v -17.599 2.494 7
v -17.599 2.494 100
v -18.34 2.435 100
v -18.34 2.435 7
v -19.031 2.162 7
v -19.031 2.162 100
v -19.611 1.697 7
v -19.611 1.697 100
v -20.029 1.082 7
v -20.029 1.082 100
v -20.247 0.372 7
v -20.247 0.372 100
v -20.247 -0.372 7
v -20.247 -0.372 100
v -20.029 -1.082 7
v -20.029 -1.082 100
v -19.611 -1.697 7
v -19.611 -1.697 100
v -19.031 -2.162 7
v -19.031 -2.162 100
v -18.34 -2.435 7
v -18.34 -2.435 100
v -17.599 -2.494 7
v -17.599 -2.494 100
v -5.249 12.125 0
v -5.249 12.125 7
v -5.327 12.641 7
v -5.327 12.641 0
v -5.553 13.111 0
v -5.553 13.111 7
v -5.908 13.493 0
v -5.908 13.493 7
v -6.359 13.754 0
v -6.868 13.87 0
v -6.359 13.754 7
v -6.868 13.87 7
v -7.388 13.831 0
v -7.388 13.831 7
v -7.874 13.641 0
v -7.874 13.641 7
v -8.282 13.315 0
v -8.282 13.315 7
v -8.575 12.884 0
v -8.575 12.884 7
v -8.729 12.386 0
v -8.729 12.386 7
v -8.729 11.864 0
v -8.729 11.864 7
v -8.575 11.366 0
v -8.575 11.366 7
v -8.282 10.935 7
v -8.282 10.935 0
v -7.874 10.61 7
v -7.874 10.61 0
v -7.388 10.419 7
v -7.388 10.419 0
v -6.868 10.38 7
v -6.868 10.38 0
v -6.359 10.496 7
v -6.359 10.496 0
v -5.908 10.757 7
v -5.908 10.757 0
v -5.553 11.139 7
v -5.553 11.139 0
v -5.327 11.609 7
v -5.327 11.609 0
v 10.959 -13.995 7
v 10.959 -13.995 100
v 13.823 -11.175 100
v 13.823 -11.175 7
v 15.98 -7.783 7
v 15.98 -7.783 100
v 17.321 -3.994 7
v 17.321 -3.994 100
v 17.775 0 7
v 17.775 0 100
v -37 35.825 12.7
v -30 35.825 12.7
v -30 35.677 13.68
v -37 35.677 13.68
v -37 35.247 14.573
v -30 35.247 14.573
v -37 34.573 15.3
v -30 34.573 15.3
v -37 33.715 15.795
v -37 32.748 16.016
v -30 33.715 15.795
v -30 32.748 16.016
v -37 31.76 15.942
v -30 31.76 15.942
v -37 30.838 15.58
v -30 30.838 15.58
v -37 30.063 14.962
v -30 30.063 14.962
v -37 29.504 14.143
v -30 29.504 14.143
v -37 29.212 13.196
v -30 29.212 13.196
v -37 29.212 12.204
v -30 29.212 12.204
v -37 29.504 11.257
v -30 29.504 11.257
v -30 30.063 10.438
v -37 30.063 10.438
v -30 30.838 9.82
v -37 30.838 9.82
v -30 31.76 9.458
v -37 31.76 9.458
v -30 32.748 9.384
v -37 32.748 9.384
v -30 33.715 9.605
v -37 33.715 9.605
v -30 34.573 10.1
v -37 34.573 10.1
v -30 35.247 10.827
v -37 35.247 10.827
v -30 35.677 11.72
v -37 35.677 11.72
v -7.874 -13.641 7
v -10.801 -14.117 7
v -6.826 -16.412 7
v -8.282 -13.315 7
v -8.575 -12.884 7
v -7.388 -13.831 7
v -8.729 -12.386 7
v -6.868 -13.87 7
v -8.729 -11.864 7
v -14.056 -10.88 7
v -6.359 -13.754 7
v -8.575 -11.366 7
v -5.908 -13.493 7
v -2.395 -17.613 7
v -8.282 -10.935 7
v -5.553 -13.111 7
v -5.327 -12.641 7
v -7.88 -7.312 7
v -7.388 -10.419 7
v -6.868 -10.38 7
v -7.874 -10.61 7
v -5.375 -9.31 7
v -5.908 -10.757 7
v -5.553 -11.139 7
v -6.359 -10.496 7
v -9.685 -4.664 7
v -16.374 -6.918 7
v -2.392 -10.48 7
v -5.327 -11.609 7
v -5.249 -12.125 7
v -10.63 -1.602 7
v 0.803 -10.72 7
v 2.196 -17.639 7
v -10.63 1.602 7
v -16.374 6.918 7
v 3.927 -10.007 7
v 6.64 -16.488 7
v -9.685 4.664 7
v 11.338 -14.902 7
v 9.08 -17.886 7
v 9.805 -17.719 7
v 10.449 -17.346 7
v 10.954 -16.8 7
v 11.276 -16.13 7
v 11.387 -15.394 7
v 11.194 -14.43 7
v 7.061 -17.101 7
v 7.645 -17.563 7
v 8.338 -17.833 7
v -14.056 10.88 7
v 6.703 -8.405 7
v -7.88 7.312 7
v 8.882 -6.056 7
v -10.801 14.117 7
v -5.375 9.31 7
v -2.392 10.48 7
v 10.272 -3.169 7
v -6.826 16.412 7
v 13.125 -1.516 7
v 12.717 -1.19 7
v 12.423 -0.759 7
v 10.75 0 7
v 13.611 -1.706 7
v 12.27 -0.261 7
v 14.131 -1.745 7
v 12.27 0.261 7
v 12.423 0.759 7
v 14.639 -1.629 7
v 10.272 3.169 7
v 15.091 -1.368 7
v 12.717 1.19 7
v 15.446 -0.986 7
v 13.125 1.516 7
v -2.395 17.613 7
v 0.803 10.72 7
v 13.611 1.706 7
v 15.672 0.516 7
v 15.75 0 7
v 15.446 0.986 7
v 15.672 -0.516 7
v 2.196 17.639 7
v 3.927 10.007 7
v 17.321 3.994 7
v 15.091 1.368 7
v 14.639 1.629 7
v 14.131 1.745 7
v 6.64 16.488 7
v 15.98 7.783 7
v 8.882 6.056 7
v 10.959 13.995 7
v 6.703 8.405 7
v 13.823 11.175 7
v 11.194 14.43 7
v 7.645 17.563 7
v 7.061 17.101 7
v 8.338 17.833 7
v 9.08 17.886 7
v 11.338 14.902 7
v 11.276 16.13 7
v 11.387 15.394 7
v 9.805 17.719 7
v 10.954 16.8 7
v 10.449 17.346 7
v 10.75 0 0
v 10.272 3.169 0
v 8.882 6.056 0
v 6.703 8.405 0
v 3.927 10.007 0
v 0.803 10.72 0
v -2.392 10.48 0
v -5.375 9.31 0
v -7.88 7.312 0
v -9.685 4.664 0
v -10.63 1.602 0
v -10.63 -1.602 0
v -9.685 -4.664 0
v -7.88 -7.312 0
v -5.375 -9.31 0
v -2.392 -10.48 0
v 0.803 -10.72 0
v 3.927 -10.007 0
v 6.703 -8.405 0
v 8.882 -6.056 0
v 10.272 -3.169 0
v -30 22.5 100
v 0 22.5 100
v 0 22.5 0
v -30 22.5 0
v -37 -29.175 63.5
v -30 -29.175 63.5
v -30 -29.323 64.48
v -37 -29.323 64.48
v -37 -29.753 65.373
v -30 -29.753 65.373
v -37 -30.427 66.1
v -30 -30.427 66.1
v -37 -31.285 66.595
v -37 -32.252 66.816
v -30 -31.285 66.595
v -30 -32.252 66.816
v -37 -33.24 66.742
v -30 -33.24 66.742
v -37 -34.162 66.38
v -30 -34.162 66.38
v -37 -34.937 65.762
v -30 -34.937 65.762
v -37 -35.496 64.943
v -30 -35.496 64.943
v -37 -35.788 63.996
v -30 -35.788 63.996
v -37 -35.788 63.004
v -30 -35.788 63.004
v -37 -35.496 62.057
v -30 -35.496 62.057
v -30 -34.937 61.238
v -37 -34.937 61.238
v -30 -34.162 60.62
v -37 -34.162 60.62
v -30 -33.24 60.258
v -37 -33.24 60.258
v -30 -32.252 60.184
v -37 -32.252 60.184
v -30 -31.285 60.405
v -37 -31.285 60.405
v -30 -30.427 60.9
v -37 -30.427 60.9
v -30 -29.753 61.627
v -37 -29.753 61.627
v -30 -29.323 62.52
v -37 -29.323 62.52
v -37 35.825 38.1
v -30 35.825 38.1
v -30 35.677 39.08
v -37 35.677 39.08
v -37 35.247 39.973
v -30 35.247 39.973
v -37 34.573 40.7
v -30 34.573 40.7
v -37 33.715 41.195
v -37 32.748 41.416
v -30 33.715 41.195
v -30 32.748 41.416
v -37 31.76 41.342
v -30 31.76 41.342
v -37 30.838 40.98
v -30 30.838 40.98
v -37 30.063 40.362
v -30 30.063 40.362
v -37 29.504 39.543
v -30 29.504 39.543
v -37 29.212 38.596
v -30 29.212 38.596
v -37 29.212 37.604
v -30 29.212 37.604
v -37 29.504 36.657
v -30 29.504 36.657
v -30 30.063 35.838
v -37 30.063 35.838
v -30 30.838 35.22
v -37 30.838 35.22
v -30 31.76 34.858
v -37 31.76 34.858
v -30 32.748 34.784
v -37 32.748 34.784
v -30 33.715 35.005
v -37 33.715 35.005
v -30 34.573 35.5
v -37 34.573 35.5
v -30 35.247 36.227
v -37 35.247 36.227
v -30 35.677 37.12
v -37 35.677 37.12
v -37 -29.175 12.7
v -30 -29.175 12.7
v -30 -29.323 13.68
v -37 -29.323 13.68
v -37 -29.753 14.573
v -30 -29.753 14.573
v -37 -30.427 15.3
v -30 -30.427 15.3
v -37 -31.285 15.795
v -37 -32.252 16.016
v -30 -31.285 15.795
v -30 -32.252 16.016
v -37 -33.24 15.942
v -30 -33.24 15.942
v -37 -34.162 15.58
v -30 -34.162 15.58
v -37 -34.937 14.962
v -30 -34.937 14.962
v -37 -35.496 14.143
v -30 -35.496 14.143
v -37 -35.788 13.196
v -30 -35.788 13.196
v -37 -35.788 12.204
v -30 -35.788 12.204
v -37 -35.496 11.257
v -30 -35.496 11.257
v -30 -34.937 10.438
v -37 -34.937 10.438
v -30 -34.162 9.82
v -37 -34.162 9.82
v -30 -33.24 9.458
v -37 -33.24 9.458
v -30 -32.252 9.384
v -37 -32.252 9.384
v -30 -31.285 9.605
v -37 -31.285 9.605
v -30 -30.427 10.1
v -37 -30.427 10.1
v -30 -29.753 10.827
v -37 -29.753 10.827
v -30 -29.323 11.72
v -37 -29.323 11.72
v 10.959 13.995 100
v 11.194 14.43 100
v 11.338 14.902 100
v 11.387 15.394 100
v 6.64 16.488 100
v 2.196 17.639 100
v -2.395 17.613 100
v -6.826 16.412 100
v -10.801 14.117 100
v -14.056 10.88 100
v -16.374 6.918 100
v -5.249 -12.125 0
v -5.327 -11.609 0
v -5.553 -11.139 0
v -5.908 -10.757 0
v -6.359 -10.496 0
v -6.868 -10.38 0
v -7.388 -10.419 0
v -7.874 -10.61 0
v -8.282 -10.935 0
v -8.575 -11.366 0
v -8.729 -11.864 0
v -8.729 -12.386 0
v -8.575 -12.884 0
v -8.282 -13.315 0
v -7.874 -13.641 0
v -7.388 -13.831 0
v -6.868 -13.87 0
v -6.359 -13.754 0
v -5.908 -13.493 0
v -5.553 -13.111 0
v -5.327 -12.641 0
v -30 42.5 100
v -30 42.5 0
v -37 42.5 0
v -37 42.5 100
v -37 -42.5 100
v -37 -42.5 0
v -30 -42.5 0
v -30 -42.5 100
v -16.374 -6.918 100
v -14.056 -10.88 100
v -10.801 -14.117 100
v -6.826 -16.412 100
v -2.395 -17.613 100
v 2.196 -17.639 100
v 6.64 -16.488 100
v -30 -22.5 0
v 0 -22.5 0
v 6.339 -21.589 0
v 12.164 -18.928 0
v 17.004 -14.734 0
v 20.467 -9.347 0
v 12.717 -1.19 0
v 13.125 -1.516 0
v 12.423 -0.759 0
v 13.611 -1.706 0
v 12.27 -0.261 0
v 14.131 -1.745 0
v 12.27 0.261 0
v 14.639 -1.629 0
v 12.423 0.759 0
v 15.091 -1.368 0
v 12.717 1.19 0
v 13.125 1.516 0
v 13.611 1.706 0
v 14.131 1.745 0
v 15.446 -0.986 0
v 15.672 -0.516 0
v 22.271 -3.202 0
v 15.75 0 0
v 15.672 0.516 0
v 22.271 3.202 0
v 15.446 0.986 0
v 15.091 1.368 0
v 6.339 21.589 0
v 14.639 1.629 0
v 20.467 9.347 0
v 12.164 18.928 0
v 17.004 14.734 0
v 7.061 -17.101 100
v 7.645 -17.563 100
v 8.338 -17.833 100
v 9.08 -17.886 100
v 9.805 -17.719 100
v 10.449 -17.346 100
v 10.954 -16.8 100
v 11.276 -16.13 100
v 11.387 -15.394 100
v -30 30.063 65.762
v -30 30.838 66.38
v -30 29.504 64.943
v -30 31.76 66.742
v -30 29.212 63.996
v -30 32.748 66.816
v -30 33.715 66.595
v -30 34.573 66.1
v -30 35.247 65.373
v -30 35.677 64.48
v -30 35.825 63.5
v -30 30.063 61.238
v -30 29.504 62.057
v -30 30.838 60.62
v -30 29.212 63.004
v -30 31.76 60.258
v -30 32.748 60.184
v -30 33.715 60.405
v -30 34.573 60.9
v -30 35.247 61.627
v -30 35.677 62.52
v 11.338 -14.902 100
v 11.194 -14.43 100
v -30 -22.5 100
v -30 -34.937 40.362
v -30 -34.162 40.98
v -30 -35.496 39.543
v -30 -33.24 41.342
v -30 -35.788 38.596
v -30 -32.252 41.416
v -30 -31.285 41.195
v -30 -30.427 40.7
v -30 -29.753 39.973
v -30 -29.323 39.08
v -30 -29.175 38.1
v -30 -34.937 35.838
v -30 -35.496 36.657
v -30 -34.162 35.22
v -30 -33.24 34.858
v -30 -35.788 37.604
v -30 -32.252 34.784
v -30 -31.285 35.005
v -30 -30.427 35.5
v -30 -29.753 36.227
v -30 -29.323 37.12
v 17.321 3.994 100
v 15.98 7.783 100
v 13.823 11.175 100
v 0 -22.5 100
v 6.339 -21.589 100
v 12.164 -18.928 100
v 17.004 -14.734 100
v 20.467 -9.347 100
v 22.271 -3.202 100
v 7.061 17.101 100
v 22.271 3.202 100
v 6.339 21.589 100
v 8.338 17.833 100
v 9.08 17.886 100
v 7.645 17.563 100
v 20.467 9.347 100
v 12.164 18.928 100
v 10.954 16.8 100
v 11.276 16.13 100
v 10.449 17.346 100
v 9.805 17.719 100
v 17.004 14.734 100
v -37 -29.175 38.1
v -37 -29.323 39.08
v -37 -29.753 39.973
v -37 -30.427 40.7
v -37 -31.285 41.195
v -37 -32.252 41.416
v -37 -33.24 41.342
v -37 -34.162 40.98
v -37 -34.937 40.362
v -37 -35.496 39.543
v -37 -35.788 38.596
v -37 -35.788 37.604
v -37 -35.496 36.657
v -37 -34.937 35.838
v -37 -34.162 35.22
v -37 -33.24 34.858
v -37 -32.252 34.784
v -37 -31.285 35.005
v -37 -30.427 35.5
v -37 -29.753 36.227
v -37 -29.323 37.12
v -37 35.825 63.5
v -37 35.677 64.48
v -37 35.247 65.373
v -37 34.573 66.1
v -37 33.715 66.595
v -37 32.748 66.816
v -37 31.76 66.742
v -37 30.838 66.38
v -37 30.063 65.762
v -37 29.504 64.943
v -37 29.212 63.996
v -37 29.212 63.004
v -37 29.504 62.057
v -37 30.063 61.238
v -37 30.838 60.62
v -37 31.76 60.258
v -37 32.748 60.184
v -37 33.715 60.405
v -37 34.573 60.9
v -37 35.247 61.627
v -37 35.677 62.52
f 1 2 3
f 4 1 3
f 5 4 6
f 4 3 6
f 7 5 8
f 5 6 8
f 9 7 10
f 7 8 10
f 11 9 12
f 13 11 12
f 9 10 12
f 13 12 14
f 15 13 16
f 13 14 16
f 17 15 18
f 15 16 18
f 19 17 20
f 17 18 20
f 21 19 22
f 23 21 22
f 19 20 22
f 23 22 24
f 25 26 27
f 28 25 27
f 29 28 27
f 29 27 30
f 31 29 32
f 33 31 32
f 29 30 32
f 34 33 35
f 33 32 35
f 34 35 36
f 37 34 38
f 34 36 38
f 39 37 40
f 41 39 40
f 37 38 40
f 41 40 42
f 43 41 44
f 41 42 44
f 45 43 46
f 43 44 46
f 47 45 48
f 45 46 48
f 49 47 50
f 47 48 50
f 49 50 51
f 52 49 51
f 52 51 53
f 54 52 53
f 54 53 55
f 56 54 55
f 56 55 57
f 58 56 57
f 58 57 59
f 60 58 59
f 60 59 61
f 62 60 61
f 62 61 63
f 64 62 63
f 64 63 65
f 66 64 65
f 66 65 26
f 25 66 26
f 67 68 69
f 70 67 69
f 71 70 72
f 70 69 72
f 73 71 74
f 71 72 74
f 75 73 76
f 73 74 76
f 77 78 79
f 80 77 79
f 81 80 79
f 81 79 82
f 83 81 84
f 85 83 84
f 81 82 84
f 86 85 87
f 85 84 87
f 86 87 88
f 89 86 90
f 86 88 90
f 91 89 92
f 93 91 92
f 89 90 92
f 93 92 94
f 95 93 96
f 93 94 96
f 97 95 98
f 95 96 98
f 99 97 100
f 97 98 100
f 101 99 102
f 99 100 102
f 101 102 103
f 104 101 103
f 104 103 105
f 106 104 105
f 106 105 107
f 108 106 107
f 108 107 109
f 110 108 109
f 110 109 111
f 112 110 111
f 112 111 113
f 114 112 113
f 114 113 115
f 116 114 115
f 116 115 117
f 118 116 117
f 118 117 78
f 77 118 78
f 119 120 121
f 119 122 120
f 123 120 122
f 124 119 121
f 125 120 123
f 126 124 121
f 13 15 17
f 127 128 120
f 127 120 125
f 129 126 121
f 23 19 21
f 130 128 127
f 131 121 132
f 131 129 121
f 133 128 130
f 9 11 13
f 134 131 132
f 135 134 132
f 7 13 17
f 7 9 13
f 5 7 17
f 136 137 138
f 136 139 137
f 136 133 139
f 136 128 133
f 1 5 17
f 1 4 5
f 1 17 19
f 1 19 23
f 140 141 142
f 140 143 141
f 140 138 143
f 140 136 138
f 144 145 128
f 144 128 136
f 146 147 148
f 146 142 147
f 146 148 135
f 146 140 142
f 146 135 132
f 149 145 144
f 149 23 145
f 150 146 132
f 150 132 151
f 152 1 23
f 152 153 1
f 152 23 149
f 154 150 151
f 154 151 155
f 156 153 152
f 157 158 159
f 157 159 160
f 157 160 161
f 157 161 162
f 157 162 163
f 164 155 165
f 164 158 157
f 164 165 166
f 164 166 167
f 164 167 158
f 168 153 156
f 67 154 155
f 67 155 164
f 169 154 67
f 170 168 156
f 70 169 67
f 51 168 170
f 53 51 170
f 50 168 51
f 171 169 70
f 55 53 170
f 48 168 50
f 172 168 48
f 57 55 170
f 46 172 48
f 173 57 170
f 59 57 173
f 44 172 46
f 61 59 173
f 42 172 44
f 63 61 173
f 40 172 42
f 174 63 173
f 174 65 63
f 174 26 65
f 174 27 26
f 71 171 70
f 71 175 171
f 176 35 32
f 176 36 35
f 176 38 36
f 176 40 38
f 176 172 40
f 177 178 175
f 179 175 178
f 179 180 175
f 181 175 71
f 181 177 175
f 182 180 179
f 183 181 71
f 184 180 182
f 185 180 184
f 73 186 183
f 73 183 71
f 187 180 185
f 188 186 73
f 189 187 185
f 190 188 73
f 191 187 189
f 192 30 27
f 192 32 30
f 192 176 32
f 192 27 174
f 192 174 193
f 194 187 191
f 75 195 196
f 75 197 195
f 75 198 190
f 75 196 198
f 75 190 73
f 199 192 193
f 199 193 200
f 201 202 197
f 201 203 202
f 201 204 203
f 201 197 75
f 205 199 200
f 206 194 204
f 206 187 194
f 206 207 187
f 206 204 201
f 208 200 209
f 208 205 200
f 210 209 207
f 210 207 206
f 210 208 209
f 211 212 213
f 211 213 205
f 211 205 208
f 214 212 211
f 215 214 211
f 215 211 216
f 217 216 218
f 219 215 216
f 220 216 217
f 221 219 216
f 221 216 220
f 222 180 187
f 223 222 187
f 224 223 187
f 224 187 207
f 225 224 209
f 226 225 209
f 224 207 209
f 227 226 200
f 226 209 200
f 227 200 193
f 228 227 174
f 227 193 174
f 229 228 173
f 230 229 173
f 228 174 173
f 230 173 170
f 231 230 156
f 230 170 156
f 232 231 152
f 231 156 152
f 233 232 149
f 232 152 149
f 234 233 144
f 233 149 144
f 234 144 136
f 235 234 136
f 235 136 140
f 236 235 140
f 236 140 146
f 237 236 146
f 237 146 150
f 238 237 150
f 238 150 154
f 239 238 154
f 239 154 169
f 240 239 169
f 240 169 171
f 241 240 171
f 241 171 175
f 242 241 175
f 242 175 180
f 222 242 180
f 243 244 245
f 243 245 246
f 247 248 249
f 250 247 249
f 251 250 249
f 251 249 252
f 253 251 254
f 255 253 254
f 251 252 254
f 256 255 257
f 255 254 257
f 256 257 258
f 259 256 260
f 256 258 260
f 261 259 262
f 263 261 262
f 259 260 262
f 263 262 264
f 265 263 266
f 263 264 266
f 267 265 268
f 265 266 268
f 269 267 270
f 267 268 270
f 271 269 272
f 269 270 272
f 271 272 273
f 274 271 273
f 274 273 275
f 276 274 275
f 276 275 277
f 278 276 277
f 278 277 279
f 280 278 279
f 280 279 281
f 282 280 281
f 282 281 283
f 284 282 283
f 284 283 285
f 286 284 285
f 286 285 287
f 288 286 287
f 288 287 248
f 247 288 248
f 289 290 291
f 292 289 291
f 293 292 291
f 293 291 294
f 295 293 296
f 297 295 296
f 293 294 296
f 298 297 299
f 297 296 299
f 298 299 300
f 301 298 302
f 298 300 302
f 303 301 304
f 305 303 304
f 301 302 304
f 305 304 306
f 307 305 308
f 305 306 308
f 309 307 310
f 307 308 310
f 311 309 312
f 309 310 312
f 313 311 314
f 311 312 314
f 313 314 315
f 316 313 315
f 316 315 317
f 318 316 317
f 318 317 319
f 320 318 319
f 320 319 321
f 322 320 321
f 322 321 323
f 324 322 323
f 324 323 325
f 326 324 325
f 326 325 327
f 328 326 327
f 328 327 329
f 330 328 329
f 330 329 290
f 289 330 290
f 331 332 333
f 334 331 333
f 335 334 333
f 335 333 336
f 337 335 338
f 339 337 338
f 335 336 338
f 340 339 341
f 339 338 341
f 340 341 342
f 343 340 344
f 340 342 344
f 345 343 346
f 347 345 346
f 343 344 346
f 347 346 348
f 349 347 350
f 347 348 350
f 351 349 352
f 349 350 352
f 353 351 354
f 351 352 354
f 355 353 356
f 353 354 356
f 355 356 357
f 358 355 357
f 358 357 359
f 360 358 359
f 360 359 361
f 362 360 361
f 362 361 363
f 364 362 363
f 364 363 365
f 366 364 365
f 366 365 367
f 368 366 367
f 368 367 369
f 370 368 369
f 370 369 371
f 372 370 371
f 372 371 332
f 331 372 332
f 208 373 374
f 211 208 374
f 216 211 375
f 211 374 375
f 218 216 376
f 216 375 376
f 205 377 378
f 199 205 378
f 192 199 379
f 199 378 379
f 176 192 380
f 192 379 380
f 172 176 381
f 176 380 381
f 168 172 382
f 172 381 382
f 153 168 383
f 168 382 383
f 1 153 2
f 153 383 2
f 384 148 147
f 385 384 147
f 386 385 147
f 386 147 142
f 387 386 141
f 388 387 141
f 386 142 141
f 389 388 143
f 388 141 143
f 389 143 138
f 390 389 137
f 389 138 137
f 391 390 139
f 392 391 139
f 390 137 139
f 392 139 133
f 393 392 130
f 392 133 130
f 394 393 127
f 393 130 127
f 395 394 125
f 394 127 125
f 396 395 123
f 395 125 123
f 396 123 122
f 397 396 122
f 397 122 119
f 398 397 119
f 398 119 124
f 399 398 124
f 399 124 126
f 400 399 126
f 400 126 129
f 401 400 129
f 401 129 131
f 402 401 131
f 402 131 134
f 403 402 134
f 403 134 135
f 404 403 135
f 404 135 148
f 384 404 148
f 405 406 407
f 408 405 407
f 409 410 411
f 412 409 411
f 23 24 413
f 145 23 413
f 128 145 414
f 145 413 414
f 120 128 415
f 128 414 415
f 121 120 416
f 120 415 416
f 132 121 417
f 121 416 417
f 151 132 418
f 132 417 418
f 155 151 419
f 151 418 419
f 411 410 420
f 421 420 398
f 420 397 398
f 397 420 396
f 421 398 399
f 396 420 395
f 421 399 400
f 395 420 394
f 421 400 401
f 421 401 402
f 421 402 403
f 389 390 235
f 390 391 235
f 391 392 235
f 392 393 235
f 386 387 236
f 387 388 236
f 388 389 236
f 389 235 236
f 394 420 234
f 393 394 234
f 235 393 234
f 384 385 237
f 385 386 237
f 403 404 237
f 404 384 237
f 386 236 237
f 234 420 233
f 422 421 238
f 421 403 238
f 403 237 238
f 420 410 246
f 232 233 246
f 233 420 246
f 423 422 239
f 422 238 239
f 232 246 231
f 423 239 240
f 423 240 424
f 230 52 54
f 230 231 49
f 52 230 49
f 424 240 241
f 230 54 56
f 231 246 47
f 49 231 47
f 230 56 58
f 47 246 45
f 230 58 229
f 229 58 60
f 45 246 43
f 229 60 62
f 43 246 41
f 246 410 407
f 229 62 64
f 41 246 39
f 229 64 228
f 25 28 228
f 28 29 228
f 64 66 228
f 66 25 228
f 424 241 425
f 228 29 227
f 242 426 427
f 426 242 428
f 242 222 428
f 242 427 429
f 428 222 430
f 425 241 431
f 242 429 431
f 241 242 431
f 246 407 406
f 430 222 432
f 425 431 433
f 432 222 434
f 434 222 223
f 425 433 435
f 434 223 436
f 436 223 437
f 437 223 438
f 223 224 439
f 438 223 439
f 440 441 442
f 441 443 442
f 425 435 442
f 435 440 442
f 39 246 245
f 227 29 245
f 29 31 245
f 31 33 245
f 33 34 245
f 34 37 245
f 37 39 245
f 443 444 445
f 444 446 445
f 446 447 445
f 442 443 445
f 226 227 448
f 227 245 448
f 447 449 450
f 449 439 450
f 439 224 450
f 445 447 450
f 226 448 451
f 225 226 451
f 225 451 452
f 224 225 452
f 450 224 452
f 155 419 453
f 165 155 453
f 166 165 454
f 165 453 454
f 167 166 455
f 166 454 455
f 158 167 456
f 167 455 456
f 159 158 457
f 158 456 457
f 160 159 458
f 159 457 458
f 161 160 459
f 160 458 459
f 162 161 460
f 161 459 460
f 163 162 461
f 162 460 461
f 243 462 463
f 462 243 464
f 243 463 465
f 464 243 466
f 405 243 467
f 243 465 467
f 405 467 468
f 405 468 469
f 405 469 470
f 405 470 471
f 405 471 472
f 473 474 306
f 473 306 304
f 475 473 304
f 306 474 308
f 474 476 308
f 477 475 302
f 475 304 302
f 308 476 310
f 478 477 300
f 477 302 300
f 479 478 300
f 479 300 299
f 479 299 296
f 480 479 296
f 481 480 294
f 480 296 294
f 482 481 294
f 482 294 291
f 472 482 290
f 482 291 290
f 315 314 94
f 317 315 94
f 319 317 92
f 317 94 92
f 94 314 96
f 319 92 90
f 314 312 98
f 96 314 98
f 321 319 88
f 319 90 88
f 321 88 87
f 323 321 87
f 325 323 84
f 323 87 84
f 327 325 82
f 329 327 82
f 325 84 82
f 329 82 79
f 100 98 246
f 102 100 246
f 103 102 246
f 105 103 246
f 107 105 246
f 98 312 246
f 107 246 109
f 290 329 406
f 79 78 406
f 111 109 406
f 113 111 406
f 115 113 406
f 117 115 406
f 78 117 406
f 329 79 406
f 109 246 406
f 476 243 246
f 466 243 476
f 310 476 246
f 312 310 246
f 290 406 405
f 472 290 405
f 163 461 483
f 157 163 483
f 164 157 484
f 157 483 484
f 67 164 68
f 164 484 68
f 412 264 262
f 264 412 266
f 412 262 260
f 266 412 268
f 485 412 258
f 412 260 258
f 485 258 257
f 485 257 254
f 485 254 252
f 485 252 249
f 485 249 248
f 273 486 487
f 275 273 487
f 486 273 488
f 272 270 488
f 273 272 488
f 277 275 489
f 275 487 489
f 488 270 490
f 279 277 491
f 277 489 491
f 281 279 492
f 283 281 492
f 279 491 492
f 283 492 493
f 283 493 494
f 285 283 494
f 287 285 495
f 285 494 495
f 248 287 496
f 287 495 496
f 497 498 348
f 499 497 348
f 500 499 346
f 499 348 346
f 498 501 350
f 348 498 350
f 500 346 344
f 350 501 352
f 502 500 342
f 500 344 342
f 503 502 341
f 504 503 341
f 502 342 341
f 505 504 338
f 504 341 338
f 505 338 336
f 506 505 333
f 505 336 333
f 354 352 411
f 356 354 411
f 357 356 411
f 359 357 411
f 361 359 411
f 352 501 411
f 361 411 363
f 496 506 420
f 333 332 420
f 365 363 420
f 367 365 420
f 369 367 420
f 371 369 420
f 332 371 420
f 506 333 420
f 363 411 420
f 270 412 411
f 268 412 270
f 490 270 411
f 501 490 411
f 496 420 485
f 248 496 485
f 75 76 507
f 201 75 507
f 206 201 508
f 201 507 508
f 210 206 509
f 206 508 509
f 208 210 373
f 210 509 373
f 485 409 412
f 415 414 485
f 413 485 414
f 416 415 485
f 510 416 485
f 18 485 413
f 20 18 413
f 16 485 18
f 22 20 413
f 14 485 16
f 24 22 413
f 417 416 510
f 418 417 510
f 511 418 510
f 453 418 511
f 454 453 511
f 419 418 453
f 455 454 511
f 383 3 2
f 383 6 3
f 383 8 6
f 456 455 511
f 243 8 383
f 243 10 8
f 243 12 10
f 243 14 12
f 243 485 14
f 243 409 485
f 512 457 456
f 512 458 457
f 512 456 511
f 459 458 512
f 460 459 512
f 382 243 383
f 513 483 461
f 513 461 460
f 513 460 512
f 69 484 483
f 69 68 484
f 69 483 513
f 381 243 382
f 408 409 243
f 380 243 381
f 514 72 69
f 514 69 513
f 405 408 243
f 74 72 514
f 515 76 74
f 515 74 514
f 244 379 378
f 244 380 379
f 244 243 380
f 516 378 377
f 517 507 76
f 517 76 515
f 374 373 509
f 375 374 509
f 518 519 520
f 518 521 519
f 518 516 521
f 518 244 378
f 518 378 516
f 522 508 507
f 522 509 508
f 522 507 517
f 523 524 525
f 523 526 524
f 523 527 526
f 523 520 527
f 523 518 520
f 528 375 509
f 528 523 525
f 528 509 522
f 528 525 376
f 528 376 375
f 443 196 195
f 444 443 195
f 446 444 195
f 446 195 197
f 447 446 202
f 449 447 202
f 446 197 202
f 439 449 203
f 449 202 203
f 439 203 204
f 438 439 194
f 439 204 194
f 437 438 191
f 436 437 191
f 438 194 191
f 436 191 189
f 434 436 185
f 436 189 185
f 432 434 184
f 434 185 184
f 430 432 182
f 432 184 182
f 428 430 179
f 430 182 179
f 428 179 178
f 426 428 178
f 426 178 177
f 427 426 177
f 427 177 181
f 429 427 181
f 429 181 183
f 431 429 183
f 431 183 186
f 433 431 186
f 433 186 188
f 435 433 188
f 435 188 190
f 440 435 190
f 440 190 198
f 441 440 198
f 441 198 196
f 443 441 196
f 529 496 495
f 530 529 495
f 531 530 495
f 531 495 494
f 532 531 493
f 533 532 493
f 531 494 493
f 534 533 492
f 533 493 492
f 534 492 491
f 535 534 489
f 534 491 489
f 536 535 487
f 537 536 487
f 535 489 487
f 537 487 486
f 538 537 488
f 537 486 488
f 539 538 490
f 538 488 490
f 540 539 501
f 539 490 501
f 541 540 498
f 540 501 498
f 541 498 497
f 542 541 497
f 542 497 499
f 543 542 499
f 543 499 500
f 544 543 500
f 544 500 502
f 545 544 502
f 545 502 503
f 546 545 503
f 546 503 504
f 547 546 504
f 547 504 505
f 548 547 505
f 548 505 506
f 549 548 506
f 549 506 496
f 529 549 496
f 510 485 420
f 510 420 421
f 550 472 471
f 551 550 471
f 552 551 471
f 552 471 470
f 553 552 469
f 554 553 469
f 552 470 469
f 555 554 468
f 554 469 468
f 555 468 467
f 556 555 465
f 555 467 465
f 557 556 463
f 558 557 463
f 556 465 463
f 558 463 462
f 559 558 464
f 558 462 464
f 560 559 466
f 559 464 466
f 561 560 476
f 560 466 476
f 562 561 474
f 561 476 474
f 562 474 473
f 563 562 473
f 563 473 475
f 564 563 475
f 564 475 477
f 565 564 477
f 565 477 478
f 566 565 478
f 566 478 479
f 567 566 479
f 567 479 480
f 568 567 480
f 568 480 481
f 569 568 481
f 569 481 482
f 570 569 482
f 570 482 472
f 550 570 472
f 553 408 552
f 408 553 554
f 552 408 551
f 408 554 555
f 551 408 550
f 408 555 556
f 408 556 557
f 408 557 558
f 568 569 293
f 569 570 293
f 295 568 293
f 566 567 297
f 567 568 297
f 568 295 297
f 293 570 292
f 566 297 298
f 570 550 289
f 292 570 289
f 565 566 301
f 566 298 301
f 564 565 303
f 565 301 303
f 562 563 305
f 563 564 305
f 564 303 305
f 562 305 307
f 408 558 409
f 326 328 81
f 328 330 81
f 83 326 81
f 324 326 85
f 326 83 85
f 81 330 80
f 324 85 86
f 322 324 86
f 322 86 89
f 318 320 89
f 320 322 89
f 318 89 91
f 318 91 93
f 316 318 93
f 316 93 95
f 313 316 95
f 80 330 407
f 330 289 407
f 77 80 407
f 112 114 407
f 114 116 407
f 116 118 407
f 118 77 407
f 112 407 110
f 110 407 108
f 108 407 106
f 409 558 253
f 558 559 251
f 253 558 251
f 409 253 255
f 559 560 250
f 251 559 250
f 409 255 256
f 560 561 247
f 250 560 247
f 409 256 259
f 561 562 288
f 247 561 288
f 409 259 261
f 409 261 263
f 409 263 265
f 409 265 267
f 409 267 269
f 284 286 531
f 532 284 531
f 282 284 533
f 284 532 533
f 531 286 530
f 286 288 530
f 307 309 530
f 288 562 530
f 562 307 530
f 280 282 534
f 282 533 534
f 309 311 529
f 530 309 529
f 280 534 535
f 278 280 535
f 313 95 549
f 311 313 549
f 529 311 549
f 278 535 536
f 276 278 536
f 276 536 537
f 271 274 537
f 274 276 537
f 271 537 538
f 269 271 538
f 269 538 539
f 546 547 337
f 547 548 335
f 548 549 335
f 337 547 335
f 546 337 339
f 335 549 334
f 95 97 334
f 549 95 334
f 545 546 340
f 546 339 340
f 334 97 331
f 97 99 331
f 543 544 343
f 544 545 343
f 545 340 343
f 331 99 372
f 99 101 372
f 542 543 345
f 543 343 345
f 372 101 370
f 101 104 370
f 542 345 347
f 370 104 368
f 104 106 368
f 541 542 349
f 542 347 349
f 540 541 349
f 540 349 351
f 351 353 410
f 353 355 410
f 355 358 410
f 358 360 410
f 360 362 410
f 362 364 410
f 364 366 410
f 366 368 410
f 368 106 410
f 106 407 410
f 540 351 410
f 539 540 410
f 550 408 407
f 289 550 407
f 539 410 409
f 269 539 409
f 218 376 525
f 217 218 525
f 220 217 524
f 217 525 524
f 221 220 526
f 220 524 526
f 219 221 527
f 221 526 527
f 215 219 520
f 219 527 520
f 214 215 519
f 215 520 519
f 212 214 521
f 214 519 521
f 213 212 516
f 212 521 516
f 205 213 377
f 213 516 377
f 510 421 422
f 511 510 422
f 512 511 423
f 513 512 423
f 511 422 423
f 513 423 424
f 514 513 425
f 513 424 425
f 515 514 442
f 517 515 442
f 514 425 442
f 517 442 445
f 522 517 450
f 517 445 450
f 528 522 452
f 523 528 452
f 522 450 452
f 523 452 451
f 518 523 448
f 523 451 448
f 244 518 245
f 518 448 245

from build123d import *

# Parameters (mm, degrees)
F1_DEPTH = 100
F3_DEPTH = 93
F4_R     = 10.75
F4_R_2   = 1.75
F5_DEPTH = 7.001
F6_R     = 3.325
F7_DEPTH = 7.001


with BuildPart() as f1:
    # F0 (on Top) → F1 (new body)
    with BuildSketch(Plane.XY):
        with BuildLine():
            Line((-30, -22.5), (0, -22.5))
            ThreePointArc((0, -22.5), (22.5, 0), (0, 22.5))
            Line((0, 22.5), (-30, 22.5))
            Line((-30, 22.5), (-30, 42.5))
            Line((-30, 42.5), (-37, 42.5))
            Line((-37, 42.5), (-37, -42.5))
            Line((-37, -42.5), (-30, -42.5))
            Line((-30, -42.5), (-30, -22.5))
        make_face()
    extrude(amount=F1_DEPTH)

    # F2 (on face) → F3 (cut)
    with BuildSketch(Plane.XY.offset(100)):
        with BuildLine():
            ThreePointArc((10.9589791569, -13.9946918808), (15.9804017395, -7.7831475152), (17.775, 0))
            ThreePointArc((17.775, 0), (15.9804017395, 7.7831475152), (10.9589791569, 13.9946918808))
            ThreePointArc((10.9589791569, 13.9946918808), (7.6371976915, 13.2287125761), (6.6395155094, 16.4884037675))
            ThreePointArc((6.6395155094, 16.4884037675), (-8.8876758914, 15.3935), (-17.5991912799, 2.493810597))
            ThreePointArc((-17.5991912799, 2.493810597), (-15.9461312513, 1.7044761952), (-15.275, 0))
            ThreePointArc((-15.275, 0), (-15.9461312513, -1.7044761952), (-17.5991912799, -2.493810597))
            ThreePointArc((-17.5991912799, -2.493810597), (-8.8876758914, -15.3935), (6.6395155094, -16.4884037675))
            ThreePointArc((6.6395155094, -16.4884037675), (7.6371976915, -13.2287125761), (10.9589791569, -13.9946918808))
        make_face()
        with BuildLine():
            ThreePointArc((6.6395155094, 16.4884037675), (7.6371976915, 13.2287125761), (10.9589791569, 13.9946918808))
            ThreePointArc((10.9589791569, 13.9946918808), (8.8871482138, 15.3938046508), (6.6395155094, 16.4884037675))
        make_face()
        with BuildLine():
            ThreePointArc((6.6395155094, 16.4884037675), (8.8871482138, 15.3938046508), (10.9589791569, 13.9946918808))
            ThreePointArc((10.9589791569, 13.9946918808), (11.2777106327, 14.662223267), (11.3871482138, 15.3938046508))
            ThreePointArc((11.3871482138, 15.3938046508), (9.4488056891, 17.8298959628), (6.6395155094, 16.4884037675))
        make_face()
        with BuildLine():
            ThreePointArc((11.3871482138, -15.3938046508), (11.2777106327, -14.662223267), (10.9589791569, -13.9946918808))
            ThreePointArc((10.9589791569, -13.9946918808), (8.8871482138, -15.3938046508), (6.6395155094, -16.4884037675))
            ThreePointArc((6.6395155094, -16.4884037675), (9.4488056891, -17.8298959628), (11.3871482138, -15.3938046508))
        make_face()
        with BuildLine():
            ThreePointArc((6.6395155094, -16.4884037675), (8.8871482138, -15.3938046508), (10.9589791569, -13.9946918808))
            ThreePointArc((10.9589791569, -13.9946918808), (7.6371976915, -13.2287125761), (6.6395155094, -16.4884037675))
        make_face()
        with BuildLine():
            ThreePointArc((-15.275, 0), (-15.9461312513, 1.7044761952), (-17.5991912799, 2.493810597))
            ThreePointArc((-17.5991912799, 2.493810597), (-17.775, 0), (-17.5991912799, -2.493810597))
            ThreePointArc((-17.5991912799, -2.493810597), (-15.9461312513, -1.7044761952), (-15.275, 0))
        make_face()
        with BuildLine():
            ThreePointArc((-17.5991912799, -2.493810597), (-17.775, 0), (-17.5991912799, 2.493810597))
            ThreePointArc((-17.5991912799, 2.493810597), (-20.275, 0), (-17.5991912799, -2.493810597))
        make_face()
    extrude(amount=-F3_DEPTH, mode=Mode.SUBTRACT)

    # F4 (on face) → F5 (cut, through all)
    with BuildSketch(Plane.XY.offset(7)):
        Circle(F4_R)
        with Locations((14, 0)):
            Circle(F4_R_2)
        with Locations((-6.998768, 12.1250668651)):
            Circle(F4_R_2)
        with Locations((-6.998768, -12.1250668651)):
            Circle(F4_R_2)
    extrude(amount=-F5_DEPTH, mode=Mode.SUBTRACT)

    # F6 (on face) → F7 (cut, through all)
    with BuildSketch(Plane.YZ.offset(-30)):
        with Locations((32.5, 12.7)):
            Circle(F6_R)
        with Locations((-32.5, 12.7)):
            Circle(F6_R)
        with Locations((-32.5, 63.5)):
            Circle(F6_R)
        with Locations((32.5, 63.5)):
            Circle(F6_R)
        with Locations((-32.5, 38.1)):
            Circle(F6_R)
        with Locations((32.5, 38.1)):
            Circle(F6_R)
    extrude(amount=-F7_DEPTH, mode=Mode.SUBTRACT)


solid = f1.part
